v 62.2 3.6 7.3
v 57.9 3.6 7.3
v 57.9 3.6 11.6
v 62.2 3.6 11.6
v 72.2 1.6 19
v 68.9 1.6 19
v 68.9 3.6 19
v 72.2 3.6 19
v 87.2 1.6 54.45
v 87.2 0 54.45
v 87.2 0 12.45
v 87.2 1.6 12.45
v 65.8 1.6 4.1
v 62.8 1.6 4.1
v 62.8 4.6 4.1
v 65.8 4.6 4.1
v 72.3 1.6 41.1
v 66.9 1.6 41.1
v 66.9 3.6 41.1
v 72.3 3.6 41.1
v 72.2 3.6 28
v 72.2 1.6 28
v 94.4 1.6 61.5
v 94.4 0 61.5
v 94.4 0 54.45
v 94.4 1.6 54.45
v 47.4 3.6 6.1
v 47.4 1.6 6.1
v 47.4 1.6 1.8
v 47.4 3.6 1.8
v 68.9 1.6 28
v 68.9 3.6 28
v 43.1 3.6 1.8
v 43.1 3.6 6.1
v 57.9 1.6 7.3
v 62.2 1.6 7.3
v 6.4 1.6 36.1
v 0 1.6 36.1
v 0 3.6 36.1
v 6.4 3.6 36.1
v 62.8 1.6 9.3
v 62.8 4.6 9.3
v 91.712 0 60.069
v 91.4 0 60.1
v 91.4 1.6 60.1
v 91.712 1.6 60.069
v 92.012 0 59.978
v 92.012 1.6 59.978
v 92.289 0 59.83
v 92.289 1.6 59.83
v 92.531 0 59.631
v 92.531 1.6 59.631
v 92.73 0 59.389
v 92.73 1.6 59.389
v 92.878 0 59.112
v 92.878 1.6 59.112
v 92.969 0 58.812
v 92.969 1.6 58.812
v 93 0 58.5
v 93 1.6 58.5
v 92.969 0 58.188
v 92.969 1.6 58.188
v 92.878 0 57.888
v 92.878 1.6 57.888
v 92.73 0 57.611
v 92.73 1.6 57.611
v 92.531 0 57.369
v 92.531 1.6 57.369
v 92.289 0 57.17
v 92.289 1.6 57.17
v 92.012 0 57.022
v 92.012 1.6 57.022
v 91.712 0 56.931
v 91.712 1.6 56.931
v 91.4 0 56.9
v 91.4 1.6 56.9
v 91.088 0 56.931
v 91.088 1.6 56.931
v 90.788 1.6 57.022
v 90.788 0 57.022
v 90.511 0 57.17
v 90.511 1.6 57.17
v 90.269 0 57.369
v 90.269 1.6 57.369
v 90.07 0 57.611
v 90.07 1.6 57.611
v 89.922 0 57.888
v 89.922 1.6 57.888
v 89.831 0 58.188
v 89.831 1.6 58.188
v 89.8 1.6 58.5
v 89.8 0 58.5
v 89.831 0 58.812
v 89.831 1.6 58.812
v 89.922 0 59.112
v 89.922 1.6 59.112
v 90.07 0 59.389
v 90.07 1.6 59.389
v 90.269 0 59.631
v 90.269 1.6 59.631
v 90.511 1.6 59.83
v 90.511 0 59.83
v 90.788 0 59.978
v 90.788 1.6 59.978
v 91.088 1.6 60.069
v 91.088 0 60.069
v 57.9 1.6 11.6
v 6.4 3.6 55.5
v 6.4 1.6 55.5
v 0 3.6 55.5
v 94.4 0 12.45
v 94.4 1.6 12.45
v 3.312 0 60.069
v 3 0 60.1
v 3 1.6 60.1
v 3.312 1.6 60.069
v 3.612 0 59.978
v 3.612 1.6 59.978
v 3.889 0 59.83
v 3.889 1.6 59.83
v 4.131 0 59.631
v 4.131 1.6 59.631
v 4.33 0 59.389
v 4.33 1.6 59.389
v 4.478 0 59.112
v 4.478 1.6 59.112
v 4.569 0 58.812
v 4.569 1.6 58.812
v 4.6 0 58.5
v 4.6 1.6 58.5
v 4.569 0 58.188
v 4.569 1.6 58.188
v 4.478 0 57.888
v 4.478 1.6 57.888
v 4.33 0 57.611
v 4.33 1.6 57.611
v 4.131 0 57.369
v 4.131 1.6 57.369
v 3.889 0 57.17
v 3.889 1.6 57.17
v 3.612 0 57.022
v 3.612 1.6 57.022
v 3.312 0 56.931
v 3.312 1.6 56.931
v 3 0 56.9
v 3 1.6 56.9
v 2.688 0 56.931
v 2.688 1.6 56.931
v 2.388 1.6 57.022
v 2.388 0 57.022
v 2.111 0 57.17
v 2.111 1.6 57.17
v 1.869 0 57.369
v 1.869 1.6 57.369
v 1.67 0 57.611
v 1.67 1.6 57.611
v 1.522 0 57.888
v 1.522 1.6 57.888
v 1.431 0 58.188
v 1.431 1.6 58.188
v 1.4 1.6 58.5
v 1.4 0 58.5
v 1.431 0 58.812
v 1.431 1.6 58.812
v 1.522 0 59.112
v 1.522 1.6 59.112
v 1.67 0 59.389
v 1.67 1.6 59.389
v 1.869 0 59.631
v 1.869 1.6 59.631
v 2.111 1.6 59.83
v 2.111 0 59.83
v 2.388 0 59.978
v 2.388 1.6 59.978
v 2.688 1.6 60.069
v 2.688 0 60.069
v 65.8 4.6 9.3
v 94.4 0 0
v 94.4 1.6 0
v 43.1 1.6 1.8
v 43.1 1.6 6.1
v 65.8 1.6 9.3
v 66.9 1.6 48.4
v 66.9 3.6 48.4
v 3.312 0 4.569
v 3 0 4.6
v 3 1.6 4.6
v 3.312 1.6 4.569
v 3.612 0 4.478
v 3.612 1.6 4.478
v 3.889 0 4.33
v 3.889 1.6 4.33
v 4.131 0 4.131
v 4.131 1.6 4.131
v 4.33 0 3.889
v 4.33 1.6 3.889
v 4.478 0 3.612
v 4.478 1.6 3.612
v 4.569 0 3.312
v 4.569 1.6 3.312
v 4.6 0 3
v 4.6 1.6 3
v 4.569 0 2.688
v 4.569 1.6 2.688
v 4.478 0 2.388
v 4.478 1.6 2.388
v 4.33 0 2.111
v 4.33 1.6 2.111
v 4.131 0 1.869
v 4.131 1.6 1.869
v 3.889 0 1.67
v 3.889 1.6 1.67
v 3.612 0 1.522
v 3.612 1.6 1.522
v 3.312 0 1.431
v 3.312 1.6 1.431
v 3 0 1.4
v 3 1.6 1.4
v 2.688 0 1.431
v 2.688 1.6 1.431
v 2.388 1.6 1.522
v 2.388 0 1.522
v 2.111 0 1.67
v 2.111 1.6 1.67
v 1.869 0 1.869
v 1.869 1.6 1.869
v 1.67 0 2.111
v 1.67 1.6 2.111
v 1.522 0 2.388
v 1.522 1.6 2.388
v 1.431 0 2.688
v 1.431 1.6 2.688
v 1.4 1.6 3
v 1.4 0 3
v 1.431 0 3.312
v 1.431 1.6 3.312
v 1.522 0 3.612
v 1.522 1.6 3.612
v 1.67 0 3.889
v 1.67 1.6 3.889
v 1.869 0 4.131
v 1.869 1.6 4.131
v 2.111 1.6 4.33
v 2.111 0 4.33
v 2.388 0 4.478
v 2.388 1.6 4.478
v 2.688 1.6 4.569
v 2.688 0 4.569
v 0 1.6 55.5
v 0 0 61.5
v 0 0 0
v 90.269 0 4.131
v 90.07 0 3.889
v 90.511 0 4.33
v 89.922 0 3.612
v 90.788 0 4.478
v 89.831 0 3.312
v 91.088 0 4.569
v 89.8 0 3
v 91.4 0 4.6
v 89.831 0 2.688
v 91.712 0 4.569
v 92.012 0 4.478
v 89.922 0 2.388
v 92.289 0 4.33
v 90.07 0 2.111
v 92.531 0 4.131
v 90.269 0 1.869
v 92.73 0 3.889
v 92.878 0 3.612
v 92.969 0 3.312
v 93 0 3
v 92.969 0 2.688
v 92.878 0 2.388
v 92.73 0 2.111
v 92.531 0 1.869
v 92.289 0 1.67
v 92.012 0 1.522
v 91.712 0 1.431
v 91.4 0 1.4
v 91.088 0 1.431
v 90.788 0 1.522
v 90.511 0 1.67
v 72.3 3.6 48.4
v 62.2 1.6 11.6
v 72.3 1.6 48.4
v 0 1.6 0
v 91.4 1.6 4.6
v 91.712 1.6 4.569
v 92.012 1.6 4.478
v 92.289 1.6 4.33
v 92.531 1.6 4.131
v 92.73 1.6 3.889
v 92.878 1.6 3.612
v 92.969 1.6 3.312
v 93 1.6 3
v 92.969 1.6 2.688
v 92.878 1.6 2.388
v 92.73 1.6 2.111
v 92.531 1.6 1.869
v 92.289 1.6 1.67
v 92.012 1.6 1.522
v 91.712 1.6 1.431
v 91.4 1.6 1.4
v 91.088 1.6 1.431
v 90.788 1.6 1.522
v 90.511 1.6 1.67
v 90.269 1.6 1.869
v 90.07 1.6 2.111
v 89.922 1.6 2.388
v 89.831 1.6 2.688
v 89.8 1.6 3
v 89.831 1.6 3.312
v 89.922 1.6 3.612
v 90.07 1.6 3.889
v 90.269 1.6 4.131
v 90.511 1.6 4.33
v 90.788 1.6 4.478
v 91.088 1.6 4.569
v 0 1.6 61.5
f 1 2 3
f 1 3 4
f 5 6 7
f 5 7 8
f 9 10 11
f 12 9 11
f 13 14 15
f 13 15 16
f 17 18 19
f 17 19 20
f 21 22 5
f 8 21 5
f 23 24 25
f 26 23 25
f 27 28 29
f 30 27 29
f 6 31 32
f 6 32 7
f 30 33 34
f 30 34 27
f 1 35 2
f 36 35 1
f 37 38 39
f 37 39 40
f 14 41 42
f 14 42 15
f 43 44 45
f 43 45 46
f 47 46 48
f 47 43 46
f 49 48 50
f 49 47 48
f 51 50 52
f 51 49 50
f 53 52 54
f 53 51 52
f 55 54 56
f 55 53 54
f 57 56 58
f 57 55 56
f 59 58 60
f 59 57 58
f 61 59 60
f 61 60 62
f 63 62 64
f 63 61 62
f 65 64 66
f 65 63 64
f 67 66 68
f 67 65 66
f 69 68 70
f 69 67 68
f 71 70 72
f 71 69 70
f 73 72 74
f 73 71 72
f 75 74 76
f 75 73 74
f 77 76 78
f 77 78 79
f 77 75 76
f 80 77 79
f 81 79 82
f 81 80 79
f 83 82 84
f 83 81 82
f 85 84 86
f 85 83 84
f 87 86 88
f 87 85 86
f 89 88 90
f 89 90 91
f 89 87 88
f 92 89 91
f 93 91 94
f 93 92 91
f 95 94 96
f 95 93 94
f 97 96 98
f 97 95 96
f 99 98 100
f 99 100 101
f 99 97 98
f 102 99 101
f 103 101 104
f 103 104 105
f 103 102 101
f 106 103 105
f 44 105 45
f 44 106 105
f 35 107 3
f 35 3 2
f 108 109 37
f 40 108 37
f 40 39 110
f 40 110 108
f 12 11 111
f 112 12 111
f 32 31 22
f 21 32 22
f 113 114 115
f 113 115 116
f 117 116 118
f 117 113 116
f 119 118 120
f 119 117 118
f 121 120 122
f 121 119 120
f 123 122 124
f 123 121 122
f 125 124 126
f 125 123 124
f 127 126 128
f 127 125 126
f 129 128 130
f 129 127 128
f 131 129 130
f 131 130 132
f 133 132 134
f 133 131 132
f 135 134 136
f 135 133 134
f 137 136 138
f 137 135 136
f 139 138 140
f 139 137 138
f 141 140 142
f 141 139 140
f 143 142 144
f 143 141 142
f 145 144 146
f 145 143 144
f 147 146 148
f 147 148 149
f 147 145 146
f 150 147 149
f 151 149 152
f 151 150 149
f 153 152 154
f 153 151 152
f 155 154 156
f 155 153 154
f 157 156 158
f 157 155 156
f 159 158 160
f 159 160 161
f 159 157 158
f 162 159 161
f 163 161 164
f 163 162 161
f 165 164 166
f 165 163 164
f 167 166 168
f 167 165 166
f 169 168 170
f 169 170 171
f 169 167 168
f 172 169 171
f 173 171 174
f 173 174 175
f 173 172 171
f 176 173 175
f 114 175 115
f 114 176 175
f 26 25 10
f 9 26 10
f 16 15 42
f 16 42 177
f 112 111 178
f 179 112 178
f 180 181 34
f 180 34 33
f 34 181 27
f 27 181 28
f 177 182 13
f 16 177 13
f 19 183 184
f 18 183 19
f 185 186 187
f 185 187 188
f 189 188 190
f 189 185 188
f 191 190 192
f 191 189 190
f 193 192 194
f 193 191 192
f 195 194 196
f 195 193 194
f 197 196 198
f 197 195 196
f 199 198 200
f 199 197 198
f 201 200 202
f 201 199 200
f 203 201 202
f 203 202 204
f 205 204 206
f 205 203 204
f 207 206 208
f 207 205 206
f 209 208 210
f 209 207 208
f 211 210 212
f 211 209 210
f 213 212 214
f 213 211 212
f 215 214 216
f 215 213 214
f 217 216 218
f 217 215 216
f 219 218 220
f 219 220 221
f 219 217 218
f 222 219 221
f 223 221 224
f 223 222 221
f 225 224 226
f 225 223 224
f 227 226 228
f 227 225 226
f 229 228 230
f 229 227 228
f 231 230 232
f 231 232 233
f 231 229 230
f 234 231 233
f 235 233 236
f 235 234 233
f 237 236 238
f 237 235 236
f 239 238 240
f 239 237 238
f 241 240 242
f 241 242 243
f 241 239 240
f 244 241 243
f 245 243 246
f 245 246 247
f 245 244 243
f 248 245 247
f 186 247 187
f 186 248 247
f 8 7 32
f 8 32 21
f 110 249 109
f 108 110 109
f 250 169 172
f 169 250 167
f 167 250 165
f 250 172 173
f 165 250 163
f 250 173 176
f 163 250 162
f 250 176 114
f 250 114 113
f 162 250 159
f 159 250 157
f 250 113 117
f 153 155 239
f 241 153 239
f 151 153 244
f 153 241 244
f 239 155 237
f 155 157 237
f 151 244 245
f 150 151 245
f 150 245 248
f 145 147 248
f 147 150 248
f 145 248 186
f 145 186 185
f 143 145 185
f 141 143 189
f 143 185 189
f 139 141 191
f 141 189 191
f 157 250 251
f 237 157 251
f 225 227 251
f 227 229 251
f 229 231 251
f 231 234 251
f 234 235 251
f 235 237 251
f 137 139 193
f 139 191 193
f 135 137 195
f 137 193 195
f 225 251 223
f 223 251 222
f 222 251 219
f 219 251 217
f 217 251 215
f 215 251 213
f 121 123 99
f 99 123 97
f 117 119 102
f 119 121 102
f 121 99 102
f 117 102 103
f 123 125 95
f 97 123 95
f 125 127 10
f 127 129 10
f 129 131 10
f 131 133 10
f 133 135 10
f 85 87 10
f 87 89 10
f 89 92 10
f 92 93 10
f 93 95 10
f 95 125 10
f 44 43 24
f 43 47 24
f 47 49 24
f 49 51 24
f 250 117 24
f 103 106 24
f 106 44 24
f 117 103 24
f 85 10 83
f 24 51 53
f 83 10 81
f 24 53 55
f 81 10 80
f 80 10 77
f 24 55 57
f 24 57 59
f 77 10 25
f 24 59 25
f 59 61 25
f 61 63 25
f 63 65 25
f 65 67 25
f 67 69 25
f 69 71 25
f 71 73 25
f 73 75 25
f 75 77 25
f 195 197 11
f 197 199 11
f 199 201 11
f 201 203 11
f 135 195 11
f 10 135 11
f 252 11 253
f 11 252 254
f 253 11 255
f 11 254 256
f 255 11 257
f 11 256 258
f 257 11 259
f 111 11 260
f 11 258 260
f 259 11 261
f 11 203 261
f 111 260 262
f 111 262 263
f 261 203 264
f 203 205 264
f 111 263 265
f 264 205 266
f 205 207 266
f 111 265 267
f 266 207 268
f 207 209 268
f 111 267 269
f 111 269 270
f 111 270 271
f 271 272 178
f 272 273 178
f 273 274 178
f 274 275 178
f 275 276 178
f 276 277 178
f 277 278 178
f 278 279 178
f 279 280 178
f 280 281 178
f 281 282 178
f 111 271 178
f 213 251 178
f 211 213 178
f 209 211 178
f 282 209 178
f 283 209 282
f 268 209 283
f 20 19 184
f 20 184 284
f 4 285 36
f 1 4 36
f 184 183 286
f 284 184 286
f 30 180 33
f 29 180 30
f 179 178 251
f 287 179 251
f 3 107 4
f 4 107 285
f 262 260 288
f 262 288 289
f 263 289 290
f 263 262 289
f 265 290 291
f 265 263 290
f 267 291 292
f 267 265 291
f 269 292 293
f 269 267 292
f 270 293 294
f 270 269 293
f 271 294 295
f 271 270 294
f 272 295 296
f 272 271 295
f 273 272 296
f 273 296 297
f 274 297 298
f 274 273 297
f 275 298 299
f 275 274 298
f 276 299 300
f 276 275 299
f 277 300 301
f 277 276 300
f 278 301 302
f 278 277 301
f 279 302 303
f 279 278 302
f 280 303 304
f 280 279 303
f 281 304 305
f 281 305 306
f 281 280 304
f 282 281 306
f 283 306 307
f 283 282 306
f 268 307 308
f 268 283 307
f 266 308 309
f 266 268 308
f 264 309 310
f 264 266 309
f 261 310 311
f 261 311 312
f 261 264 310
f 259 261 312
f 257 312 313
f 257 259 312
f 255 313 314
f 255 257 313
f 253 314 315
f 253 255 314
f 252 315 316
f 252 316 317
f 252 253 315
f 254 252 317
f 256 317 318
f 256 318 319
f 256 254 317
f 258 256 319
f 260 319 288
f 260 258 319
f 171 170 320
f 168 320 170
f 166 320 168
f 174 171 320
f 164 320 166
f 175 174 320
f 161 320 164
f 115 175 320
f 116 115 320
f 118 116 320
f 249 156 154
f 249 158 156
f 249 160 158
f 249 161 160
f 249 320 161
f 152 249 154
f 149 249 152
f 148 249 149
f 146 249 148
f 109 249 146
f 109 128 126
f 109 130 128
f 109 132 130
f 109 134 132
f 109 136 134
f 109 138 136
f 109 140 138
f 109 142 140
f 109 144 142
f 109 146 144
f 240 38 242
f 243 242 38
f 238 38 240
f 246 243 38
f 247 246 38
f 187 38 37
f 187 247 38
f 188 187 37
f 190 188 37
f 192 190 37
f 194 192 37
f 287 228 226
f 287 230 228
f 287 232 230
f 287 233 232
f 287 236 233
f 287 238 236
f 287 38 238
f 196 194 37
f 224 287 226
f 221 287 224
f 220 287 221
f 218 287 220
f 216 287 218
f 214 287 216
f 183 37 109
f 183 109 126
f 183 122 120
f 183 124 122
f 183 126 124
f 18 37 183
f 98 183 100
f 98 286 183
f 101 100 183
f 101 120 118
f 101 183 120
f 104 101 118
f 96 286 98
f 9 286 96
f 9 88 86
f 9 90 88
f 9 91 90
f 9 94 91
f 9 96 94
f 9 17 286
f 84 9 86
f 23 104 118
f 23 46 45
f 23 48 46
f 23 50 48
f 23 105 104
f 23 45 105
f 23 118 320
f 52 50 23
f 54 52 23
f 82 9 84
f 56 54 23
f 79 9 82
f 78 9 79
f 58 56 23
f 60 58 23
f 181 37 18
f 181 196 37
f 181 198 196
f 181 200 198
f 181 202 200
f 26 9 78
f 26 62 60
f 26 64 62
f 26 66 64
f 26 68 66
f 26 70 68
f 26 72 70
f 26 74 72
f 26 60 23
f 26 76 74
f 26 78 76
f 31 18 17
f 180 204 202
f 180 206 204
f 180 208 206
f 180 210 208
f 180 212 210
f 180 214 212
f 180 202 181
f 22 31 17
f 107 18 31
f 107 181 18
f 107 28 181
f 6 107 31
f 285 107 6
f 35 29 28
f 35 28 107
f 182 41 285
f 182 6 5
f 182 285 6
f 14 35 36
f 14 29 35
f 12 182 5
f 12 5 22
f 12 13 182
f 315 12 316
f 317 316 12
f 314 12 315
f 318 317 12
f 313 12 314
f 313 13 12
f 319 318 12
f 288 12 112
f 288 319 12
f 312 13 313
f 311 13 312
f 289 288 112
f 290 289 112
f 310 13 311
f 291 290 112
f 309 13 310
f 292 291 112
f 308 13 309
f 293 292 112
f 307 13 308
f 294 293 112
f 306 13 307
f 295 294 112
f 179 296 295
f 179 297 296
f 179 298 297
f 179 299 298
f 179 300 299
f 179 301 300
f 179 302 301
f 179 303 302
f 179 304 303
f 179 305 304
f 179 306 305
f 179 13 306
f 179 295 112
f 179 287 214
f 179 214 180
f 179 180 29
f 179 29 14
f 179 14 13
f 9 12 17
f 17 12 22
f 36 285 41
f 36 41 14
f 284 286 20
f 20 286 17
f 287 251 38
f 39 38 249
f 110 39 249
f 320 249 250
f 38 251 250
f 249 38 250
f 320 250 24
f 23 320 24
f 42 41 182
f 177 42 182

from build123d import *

# Parameters (mm, degrees)
SKETCH_1_R      = 1.6
EXTRUDE_1_DEPTH = 1.6
SKETCH_2_W      = 6.4
SKETCH_2_H      = 19.4
SKETCH_2_W_2    = 5.4
SKETCH_2_H_2    = 7.3
SKETCH_2_W_3    = 3.3
SKETCH_2_H_3    = 9
SKETCH_2_W_4    = 4.3
SKETCH_2_H_4    = 4.3
EXTRUDE_2_DEPTH = 2
SKETCH_3_W      = 3
SKETCH_3_H      = 5.2
EXTRUDE_3_DEPTH = 3


with BuildPart() as part:
    # 草图1 → 凸台-拉伸1 (new body)
    with BuildSketch(Plane(origin=(0, 0, 0), x_dir=(1, 0, 0), z_dir=(0, 1, 0))):
        Polygon((94.4, 0), (0, 0), (0, -61.5), (94.4, -61.5), (94.4, -54.45), (87.2, -54.45), (87.2, -12.45), (94.4, -12.45), align=None)
        with Locations(Location((3, -58.5, 0), (0, 0, 270))):
            Circle(SKETCH_1_R, mode=Mode.SUBTRACT)
        with Locations(Location((91.4, -58.5, 0), (0, 0, 270))):
            Circle(SKETCH_1_R, mode=Mode.SUBTRACT)
        with Locations(Location((3, -3, 0), (0, 0, 270))):
            Circle(SKETCH_1_R, mode=Mode.SUBTRACT)
        with Locations(Location((91.4, -3, 0), (0, 0, 270))):
            Circle(SKETCH_1_R, mode=Mode.SUBTRACT)
    extrude(amount=EXTRUDE_1_DEPTH)

    # 草图2 → 凸台-拉伸2 (add)
    with BuildSketch(Plane(origin=(0, 1.6, 0), x_dir=(1, 0, 0), z_dir=(0, 1, 0))):
        with Locations((3.2, -45.8)):
            Rectangle(SKETCH_2_W, SKETCH_2_H)
        with Locations((69.6, -44.75)):
            Rectangle(SKETCH_2_W_2, SKETCH_2_H_2)
        with Locations((70.55, -23.5)):
            Rectangle(SKETCH_2_W_3, SKETCH_2_H_3)
        with Locations((45.25, -3.95)):
            Rectangle(SKETCH_2_W_4, SKETCH_2_H_4)
        with Locations((60.05, -9.45)):
            Rectangle(SKETCH_2_W_4, SKETCH_2_H_4)
    extrude(amount=EXTRUDE_2_DEPTH)

    # 草图3 → 凸台-拉伸3 (add)
    with BuildSketch(Plane(origin=(0, 1.6, 0), x_dir=(1, 0, 0), z_dir=(0, 1, 0))):
        with Locations((64.3, -6.7)):
            Rectangle(SKETCH_3_W, SKETCH_3_H)
    extrude(amount=EXTRUDE_3_DEPTH)


solid = part.part
